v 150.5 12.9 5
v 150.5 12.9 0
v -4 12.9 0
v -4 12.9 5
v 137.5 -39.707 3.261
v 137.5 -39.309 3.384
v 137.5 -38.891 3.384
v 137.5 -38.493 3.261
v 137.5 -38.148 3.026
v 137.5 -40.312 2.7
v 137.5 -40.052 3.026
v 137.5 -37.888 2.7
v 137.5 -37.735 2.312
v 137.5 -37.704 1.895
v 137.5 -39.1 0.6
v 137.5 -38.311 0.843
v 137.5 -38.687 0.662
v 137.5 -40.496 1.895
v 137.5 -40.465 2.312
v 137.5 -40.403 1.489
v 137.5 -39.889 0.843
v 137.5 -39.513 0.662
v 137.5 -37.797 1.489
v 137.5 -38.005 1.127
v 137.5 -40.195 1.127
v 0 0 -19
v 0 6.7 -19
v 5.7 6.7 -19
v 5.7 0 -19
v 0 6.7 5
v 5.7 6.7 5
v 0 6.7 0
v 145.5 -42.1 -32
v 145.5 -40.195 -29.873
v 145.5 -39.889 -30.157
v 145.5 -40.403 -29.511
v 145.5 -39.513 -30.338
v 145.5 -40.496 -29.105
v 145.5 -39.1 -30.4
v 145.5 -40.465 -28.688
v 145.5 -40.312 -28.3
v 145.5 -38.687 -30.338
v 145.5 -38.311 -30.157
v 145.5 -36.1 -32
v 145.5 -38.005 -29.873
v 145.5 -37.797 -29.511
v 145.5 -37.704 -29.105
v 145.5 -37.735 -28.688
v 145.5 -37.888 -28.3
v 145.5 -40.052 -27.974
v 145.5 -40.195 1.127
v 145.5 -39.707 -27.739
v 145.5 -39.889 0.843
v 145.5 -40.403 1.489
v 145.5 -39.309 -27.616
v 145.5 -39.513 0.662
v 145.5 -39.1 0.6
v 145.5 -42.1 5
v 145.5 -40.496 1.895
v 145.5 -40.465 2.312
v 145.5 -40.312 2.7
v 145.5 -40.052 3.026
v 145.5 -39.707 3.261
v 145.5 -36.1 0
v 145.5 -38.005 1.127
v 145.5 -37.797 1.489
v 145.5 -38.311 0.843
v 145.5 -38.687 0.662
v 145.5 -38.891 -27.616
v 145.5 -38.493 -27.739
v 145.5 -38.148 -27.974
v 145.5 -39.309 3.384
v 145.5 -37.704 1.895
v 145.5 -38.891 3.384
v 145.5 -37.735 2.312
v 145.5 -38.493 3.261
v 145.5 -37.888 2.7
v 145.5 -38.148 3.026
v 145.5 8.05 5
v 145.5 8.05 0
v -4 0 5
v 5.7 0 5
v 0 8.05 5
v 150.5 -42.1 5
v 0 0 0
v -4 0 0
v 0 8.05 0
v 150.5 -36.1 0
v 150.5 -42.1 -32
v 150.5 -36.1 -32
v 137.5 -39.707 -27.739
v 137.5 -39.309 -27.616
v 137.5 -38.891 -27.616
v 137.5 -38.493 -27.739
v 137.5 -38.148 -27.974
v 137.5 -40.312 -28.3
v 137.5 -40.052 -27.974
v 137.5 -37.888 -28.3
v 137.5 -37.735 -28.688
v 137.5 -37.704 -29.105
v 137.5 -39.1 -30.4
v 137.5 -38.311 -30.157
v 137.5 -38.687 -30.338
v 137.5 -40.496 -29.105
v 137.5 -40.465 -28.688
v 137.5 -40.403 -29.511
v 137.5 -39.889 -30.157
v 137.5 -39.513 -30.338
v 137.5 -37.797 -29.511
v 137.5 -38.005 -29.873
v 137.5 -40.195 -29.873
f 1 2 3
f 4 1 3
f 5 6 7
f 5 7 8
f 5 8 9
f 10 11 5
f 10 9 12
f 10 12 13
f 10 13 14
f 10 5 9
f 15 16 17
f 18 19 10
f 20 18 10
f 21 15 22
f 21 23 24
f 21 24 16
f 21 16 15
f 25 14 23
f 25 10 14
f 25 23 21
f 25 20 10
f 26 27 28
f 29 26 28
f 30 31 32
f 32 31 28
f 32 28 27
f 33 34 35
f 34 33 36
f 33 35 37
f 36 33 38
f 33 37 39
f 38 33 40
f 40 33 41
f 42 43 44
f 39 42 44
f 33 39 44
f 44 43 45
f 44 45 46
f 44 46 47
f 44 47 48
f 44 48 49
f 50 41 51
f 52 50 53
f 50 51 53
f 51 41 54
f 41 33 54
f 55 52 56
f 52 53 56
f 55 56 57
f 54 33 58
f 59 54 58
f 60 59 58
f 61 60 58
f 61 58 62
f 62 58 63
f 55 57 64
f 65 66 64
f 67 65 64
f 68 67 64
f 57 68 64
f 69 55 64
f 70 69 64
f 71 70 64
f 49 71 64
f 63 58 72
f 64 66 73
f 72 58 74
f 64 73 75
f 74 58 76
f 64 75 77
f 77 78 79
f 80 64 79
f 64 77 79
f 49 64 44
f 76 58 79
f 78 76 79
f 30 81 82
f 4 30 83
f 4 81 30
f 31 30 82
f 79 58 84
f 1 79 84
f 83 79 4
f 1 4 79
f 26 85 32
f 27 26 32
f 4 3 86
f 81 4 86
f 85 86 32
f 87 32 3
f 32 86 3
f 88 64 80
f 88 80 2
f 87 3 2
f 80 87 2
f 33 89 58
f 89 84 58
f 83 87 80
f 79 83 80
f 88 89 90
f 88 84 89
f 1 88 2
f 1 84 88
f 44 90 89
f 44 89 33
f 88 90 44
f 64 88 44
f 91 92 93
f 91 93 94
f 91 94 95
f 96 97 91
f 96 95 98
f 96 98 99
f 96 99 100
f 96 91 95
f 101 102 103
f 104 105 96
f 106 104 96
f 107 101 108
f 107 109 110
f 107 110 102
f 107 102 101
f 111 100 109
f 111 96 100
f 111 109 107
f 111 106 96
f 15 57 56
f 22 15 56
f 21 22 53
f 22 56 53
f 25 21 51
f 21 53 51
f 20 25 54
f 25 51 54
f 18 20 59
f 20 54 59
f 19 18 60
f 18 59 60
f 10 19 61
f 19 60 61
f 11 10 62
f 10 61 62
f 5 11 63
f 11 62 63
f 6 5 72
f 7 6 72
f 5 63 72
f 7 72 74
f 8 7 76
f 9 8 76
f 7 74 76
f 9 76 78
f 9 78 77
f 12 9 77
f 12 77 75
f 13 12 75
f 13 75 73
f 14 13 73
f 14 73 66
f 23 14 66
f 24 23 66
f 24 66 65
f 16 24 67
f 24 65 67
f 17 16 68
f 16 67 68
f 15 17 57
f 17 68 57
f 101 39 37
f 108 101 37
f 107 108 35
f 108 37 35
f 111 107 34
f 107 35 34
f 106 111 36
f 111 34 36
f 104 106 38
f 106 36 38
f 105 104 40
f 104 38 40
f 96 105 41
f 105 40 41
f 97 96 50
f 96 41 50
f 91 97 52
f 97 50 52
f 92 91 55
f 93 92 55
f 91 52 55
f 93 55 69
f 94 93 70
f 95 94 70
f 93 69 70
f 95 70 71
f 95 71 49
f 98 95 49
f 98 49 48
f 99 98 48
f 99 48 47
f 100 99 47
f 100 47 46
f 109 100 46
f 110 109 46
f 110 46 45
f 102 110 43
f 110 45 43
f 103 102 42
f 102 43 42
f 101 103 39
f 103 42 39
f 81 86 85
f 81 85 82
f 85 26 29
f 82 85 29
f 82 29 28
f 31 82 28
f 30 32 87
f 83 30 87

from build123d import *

# Parameters (mm, degrees)
BOSS_EXTRUDE1_DEPTH = 5
SKETCH2_W           = 5.7
SKETCH2_H           = 6.7
BOSS_EXTRUDE6_DEPTH = 24
SKETCH5_W           = 5
SKETCH5_H           = 6
BOSS_EXTRUDE7_DEPTH = 32
SKETCH4_R           = 1.4
BOSS_EXTRUDE4_DEPTH = 8


with BuildPart() as part:
    # Sketch1 → Boss-Extrude1 (new body)
    with BuildSketch(Plane.XY):
        Polygon((0, 6.7), (0, 8.05), (5.5, 8.05), (145.5, 8.05), (145.5, -42.1), (150.5, -42.1), (150.5, 8.05), (150.5, 12.9), (5.5, 12.9), (-4, 12.9), (-4, 0), (0, 0), (5.7, 0), (5.7, 6.7), align=None)
    extrude(amount=BOSS_EXTRUDE1_DEPTH)

    # Sketch2 → Boss-Extrude6 (add)
    with BuildSketch(Plane.XY.offset(5)):
        with Locations((2.85, 3.35)):
            Rectangle(SKETCH2_W, SKETCH2_H)
    extrude(amount=-BOSS_EXTRUDE6_DEPTH)

    # Sketch5 → Boss-Extrude7 (add)
    with BuildSketch(Plane(origin=(0, 0, 0), x_dir=(-1, 0, 0), z_dir=(0, 0, -1))):
        with Locations((-148, -39.1)):
            Rectangle(SKETCH5_W, SKETCH5_H)
    extrude(amount=BOSS_EXTRUDE7_DEPTH)

    # Sketch4 → Boss-Extrude4 (add)
    with BuildSketch(Plane.ZY.offset(-145.5)):
        with Locations(Location((-29, -39.1, 0), (0, 0, 180))):
            Circle(SKETCH4_R)
        with Locations(Location((2, -39.1, 0), (0, 0, 180))):
            Circle(SKETCH4_R)
    extrude(amount=BOSS_EXTRUDE4_DEPTH)


solid = part.part
